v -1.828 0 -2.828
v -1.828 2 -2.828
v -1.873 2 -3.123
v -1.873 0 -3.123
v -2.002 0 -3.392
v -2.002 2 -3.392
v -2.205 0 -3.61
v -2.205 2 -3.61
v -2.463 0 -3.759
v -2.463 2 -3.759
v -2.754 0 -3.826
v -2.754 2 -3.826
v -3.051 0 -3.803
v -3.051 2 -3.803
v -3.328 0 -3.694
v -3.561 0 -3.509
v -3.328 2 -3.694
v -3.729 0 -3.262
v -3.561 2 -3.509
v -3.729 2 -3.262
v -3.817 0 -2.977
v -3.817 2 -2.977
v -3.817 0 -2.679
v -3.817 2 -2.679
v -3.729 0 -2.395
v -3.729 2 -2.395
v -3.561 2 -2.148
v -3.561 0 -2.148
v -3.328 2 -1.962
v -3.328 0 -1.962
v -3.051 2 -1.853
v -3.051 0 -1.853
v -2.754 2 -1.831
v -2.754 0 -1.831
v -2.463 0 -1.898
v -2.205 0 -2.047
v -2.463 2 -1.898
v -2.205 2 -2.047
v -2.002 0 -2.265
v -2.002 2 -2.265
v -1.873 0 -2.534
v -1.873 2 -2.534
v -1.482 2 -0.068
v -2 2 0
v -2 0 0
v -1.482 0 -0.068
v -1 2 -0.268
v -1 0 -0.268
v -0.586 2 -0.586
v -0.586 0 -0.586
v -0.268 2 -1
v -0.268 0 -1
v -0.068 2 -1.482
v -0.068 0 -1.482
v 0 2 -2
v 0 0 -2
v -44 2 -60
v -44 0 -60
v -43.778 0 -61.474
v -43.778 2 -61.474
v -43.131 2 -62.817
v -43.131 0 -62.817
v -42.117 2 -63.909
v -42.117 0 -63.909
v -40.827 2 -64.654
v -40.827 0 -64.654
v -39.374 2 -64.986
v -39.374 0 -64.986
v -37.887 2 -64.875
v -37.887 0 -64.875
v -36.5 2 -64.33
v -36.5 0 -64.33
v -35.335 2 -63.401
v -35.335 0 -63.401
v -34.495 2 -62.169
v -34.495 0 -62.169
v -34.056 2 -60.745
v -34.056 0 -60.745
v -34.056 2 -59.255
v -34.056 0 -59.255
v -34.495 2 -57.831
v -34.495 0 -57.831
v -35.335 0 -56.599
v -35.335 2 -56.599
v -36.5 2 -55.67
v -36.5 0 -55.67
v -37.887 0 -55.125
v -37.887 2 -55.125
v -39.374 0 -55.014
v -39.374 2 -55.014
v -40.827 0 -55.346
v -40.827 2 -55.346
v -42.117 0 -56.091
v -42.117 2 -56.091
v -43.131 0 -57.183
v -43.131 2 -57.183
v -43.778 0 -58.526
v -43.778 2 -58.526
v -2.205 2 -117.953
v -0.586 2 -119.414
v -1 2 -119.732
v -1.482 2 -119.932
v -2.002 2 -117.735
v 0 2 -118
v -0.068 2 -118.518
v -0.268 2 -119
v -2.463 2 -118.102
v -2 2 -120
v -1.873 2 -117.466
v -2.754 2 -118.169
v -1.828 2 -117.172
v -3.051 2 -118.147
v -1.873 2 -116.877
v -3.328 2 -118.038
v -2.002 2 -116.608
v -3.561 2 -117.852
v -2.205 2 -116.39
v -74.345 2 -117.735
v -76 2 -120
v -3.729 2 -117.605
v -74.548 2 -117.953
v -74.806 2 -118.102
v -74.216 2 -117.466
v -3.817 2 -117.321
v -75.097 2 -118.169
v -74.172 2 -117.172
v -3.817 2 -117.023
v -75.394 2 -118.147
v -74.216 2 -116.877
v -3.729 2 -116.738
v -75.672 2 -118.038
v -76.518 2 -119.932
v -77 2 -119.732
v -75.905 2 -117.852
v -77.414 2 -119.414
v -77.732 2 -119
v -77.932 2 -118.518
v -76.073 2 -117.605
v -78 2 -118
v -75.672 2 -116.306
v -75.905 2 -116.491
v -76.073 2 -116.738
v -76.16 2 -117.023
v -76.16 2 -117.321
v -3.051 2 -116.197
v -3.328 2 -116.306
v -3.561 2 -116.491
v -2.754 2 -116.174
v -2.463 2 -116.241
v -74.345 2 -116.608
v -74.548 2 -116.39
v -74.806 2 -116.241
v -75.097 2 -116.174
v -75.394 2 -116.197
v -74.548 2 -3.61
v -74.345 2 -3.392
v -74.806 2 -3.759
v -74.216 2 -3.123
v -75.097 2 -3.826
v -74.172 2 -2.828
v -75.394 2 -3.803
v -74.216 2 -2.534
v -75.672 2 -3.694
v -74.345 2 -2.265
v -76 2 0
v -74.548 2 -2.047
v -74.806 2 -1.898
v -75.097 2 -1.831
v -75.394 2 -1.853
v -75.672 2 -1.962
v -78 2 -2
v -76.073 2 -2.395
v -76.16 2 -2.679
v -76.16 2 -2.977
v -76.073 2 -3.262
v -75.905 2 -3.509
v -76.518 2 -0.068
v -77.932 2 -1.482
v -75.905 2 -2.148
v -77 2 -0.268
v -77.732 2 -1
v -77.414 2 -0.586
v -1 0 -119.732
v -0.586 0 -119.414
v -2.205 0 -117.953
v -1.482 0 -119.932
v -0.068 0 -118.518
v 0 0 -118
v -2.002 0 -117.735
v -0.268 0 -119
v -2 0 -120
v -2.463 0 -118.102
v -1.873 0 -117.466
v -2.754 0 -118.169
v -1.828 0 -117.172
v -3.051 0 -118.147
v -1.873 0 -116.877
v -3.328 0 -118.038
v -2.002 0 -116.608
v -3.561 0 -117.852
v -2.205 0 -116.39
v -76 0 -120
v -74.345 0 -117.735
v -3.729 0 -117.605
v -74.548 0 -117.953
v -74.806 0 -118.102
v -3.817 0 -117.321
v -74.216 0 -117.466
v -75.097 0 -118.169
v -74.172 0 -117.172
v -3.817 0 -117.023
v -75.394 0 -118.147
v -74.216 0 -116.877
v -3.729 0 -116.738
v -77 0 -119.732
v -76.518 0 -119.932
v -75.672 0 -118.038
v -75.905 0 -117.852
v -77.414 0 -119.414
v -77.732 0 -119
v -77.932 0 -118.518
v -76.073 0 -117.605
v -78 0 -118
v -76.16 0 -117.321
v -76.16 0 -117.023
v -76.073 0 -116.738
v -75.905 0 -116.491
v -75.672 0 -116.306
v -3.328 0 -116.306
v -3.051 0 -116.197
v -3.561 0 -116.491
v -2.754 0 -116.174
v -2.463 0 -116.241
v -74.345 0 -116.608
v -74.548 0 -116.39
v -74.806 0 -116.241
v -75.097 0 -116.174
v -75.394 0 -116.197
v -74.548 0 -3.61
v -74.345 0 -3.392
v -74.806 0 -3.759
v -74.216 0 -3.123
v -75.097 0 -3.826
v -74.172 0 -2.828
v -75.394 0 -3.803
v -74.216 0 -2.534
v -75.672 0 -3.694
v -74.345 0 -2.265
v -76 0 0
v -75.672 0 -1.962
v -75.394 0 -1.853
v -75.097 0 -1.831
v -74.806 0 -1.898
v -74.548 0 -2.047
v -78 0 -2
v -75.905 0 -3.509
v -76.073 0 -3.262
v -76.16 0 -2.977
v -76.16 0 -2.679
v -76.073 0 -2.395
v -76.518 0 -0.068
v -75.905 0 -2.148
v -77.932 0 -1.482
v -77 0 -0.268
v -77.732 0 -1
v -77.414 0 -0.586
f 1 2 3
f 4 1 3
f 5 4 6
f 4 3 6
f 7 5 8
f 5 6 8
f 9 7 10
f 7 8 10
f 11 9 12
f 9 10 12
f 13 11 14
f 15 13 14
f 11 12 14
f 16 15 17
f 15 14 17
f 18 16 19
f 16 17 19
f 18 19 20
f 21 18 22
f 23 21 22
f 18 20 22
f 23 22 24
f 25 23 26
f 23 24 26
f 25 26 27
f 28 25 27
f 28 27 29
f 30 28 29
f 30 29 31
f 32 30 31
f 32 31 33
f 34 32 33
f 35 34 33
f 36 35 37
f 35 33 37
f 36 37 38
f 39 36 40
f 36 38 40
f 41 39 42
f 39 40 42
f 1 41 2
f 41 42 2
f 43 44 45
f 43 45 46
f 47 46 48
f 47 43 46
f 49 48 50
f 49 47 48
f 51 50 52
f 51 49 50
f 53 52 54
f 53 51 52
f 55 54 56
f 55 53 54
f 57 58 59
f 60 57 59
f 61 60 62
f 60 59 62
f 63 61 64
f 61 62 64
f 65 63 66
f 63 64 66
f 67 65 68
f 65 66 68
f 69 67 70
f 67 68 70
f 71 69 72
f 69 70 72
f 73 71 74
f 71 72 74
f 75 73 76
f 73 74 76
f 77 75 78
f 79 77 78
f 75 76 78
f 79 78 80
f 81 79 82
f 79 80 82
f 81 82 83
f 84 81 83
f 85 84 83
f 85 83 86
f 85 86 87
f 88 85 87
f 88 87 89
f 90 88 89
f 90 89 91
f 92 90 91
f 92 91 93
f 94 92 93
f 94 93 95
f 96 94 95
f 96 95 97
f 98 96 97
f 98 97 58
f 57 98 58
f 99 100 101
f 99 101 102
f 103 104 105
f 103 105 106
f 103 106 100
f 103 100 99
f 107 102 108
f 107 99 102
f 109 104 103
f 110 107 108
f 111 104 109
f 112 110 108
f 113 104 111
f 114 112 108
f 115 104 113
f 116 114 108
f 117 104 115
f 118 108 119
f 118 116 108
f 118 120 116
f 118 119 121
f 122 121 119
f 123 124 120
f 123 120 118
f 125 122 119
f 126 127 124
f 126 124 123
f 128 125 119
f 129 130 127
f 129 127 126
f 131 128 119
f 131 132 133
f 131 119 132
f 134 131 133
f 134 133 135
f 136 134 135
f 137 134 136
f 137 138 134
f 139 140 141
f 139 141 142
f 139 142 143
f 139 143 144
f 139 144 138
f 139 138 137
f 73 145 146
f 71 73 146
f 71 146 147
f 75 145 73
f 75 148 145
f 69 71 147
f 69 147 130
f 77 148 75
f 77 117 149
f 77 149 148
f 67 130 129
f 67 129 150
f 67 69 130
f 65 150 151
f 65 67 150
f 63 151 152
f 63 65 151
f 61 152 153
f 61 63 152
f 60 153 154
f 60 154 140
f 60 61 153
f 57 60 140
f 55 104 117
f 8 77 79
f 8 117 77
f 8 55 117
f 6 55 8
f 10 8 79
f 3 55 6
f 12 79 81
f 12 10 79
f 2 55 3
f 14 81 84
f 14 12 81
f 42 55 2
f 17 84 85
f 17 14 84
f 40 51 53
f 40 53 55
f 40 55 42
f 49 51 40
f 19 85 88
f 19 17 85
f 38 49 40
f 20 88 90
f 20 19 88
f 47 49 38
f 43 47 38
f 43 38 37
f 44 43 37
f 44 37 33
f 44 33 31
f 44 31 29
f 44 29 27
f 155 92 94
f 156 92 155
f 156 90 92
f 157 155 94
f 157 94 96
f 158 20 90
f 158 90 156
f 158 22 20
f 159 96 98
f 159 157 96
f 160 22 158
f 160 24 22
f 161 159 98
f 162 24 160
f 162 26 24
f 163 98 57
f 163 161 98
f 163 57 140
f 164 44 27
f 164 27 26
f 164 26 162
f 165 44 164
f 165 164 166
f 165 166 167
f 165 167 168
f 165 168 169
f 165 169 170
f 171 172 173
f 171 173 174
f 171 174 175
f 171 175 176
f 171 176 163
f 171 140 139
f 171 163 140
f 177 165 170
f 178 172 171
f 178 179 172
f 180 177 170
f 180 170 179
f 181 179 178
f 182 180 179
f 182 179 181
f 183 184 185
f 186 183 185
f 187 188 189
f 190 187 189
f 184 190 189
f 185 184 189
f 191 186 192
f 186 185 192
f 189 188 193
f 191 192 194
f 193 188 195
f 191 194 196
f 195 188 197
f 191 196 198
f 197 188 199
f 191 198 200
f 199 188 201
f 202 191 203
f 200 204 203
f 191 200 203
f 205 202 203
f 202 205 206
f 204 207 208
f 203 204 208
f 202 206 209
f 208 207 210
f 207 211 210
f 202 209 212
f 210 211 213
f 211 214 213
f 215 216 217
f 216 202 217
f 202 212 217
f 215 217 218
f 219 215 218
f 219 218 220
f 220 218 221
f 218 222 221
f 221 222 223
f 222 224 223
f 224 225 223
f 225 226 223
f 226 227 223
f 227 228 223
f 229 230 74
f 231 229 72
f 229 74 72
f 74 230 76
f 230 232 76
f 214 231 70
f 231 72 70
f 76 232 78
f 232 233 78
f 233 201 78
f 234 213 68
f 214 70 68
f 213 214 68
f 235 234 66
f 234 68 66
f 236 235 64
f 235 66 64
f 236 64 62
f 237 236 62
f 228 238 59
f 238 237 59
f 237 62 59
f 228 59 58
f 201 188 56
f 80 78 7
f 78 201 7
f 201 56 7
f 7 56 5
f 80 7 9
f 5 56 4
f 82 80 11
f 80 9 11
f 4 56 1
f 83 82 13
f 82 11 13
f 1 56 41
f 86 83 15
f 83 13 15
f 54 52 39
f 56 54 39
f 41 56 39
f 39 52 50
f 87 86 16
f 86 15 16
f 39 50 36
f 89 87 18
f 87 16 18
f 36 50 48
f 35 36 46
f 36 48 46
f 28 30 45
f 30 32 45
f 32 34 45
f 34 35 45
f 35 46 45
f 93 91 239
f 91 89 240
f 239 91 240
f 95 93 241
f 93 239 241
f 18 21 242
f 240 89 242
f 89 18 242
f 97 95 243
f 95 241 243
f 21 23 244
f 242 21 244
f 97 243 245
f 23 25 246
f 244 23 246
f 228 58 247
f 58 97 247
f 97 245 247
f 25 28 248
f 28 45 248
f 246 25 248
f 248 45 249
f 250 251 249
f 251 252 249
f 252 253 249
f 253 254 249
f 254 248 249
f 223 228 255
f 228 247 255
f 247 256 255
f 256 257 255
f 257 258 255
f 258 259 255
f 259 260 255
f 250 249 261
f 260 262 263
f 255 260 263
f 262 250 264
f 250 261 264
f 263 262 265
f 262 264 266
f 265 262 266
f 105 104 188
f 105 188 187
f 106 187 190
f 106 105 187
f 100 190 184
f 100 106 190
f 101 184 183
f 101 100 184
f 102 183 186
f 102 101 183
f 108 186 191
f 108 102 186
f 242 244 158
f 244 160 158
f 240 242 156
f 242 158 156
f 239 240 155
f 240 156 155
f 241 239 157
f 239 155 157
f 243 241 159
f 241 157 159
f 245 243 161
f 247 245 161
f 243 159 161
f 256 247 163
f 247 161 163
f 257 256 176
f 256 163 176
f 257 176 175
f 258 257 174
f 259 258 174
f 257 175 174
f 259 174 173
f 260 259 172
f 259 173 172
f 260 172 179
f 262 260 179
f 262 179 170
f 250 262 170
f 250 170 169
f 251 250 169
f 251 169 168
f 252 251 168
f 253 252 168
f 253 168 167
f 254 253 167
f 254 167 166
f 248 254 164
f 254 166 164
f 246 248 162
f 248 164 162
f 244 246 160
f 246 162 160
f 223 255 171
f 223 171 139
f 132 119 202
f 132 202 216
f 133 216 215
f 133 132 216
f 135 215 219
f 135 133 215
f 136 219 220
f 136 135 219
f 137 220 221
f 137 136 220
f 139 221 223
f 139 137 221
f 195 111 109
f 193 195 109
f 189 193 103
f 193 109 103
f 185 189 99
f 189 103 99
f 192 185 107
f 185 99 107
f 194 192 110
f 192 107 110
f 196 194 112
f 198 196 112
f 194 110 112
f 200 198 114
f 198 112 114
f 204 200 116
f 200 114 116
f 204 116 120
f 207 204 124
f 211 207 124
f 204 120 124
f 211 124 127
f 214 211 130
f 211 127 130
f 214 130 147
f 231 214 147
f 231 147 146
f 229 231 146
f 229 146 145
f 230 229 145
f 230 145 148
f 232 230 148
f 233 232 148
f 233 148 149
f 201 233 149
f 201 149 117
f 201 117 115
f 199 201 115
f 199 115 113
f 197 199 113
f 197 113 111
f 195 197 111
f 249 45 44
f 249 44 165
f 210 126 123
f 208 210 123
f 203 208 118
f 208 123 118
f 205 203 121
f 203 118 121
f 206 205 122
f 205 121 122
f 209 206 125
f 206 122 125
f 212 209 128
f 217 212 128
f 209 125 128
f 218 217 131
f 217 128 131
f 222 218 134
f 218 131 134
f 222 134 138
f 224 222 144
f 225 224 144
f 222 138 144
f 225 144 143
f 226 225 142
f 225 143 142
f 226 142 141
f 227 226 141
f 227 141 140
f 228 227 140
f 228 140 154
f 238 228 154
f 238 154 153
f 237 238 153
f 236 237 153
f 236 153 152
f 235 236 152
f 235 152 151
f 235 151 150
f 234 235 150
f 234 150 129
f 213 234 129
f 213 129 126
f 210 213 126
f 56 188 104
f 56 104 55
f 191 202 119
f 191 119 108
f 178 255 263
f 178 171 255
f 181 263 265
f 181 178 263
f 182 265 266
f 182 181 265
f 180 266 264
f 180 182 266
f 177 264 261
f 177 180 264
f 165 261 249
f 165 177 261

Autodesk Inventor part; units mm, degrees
ref_plane "YZ Plane" through (0, 0, 0) normal (1, 0, 0) x (0, 1, 0)
ref_plane "XZ Plane" through (0, 0, 0) normal (0, 1, 0) x (-1, 0, 0)
ref_plane "XY Plane" through (0, 0, 0) normal (0, 0, 1) x (1, 0, 0)
sketch "Boceto1" plane through (0, 0, 0) normal (0, 1, 0) x (-1, 0, 0)
  line L0 (0, 0) -> (78, 0)
  line L1 (78, 0) -> (78, -120)
  line L2 (78, -120) -> (0, -120)
  line L3 (0, -120) -> (0, 0)
  line L4 (39, -120) -> (39, -40.9916)
  line L5 (0, -60) -> (49.8561, -60)
  circle A0 centre (39, -60) radius 5
  dimension "d0" = 120
  dimension "d1" = 78
  dimension "d11" = 10
extrude "Extrusión1" add sketch "Boceto1" along normal blind 2 contours L0 L1 L2 L4 A0 L5 L3 | L5 A0 L4 L2 L3
fillet "Empalme1" radius 2 4 edges at (0, 1, 0) (-78, 1, -120) (0, 1, -120) (-78, 1, 0)
sketch "Boceto2" plane through (0, 2, 0) normal (0, 1, 0) x (1, 0, 0)
  circle A0 centre (0, 0) radius 4
  line L0 (0, 0) -> (-8.4064, 8.4064)
  arc A1 (-2, 0) -> (0, 2) centre (-2, 2) ccw
  circle A2 centre (-2.8284, 2.8284) radius 1
  line L1 (0, 60) -> (-13.3552, 60)
  line L2 (-39, 120) -> (-39, 106.5507)
  circle A3 centre (0, 120) radius 4
  line L3 (0, 120) -> (-8.4064, 111.5936)
  arc A4 (0, 118) -> (-2, 120) centre (-2, 118) ccw
  circle A5 centre (-2.8284, 117.1716) radius 1
  circle A6 centre (-78, 120) radius 4
  line L4 (-78, 120) -> (-69.5936, 111.5936)
  arc A7 (-76, 120) -> (-78, 118) centre (-76, 118) ccw
  circle A8 centre (-75.1716, 117.1716) radius 1
  circle A9 centre (-78, 0) radius 4
  line L5 (-78, 0) -> (-69.5936, 8.4064)
  arc A10 (-78, 2) -> (-76, 0) centre (-76, 2) ccw
  circle A11 centre (-75.1716, 2.8284) radius 1
  dimension "d5" = 8
  dimension "d8" = 2
extrude "Extrusión2" cut sketch "Boceto2" against normal blind 2 contours A2 L0 A0 | A0 L0 A2 | A2 L0 A0 | A0 L0 A2 | A5 L3 A3 | A3 L3 A5 | A5 L3 A3 | A3 L3 A5 | A8 L4 A6 | A6 L4 A8 | A8 L4 A6 | A6 L4 A8 | A11 L5 A9 | A9 L5 A11 | A11 L5 A9 | A9 L5 A11
properties part number "Chasis Tapa Raspberry Pi"
